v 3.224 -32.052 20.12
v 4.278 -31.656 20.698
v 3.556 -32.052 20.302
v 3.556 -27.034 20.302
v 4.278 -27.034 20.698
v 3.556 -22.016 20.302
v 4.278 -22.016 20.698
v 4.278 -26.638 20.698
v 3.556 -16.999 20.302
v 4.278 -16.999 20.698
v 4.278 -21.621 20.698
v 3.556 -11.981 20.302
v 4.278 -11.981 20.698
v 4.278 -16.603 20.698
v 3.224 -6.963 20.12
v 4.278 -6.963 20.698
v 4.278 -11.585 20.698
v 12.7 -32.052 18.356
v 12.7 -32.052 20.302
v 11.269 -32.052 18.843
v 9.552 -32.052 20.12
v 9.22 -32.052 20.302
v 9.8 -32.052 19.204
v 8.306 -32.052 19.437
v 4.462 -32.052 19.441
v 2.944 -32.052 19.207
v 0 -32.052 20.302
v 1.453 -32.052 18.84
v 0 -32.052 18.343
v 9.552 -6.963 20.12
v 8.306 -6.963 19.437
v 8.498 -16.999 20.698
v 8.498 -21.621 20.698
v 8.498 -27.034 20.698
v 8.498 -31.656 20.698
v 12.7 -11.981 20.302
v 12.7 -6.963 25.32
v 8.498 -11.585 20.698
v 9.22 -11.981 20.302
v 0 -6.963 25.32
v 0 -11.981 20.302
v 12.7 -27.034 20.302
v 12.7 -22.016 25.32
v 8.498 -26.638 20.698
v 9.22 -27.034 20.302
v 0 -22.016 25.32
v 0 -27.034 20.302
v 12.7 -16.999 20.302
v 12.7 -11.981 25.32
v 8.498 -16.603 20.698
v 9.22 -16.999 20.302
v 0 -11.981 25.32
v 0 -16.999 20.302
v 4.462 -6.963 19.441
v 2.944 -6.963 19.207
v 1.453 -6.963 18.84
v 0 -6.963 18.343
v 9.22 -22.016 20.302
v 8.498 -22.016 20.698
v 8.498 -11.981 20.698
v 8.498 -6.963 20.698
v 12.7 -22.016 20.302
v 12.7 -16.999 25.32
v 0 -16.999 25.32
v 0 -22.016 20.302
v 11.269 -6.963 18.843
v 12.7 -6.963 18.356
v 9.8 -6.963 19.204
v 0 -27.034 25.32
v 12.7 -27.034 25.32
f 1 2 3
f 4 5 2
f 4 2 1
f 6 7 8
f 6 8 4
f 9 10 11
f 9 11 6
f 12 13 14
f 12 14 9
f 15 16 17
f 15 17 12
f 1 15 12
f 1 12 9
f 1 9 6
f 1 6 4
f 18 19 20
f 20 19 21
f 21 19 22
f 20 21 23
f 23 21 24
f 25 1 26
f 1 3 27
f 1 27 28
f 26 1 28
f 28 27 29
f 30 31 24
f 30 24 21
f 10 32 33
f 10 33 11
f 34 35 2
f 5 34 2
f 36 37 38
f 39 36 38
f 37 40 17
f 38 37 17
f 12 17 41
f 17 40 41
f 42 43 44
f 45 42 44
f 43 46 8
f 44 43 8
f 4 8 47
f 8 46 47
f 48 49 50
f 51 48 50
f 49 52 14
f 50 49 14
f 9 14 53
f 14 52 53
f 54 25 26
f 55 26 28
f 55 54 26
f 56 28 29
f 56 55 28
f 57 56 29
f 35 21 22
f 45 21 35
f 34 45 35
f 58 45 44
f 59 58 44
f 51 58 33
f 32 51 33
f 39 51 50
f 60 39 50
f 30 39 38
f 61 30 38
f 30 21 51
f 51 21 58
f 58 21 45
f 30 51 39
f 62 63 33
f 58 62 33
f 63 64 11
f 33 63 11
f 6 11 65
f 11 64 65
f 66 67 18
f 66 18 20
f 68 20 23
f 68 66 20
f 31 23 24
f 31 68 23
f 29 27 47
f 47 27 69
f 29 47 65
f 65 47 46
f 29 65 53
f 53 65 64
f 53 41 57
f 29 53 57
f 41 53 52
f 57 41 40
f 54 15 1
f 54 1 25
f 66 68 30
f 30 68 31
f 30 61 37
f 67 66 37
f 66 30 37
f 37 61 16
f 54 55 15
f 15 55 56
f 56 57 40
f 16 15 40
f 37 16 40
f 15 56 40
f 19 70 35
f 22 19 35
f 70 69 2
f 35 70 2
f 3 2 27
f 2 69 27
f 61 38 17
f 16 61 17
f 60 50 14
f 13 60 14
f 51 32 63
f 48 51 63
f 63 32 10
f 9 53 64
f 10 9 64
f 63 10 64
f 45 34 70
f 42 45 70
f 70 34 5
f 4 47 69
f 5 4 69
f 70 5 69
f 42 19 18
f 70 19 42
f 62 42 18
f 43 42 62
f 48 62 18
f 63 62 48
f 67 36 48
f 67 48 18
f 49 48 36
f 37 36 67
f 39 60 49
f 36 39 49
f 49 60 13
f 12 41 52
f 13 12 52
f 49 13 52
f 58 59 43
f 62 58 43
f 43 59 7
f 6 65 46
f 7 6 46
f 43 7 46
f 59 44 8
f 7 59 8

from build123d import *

# Parameters (mm, degrees)
F1_DEPTH  = 12.7
F3_R      = 17.4625
F4_DEPTH  = 25.4
F11_DEPTH = 25.4


with BuildPart() as f1:
    # F0 (on Right) → F1 (new body)
    with BuildSketch(Plane.YZ):
        Polygon((-27.0339550276, 20.3022155698), (-27.0339550276, 25.3198655094), (-32.0516049672, 20.3022155698), (-32.0516049672, 16.7292077094), (-6.9633552689, 16.7292077094), (-6.9633552689, 20.3022155698), (-6.9633552689, 25.3198655094), (-11.9810052086, 20.3022155698), (-11.9810052086, 25.3198655094), (-16.9986551483, 20.3022155698), (-16.9986551483, 25.3198655094), (-22.0163050879, 20.3022155698), (-22.0163050879, 25.3198655094), align=None)
    extrude(amount=F1_DEPTH)

    # F3 (on plane+point) → F4 (cut)
    with BuildSketch(Plane.XZ.offset(6.9633552689)):
        with Locations((6.3661262393, 2.0827455446)):
            Circle(F3_R)
    extrude(amount=F4_DEPTH, mode=Mode.SUBTRACT)


with BuildPart() as f5_1:
    # F5: copy of F1
    add(f1.part)


with BuildPart() as f1_1:
    # F6: moved
    add(f1.part.moved(Location((0, 26.1449348181, 0))))


with BuildPart() as f5_1_1:
    # F7: moved
    add(f5_1.part)

    # F10 (on plane+point) → F11 (cut)
    with BuildSketch(Plane.XZ.offset(6.9633552689)):
        Polygon((6.3879799563, 18.3859299868), (9.5524290794, 20.1198235154), (8.4976138382, 20.6977874041), (7.4427951975, 20.6977874041), (5.3331647151, 20.6977874041), (4.2783460745, 20.6977874041), (3.2235308333, 20.1198235154), align=None)
    extrude(amount=F11_DEPTH, mode=Mode.SUBTRACT)


with BuildPart() as f1_2:
    # F7: moved
    add(f1_1.part)


solid = f5_1_1.part
